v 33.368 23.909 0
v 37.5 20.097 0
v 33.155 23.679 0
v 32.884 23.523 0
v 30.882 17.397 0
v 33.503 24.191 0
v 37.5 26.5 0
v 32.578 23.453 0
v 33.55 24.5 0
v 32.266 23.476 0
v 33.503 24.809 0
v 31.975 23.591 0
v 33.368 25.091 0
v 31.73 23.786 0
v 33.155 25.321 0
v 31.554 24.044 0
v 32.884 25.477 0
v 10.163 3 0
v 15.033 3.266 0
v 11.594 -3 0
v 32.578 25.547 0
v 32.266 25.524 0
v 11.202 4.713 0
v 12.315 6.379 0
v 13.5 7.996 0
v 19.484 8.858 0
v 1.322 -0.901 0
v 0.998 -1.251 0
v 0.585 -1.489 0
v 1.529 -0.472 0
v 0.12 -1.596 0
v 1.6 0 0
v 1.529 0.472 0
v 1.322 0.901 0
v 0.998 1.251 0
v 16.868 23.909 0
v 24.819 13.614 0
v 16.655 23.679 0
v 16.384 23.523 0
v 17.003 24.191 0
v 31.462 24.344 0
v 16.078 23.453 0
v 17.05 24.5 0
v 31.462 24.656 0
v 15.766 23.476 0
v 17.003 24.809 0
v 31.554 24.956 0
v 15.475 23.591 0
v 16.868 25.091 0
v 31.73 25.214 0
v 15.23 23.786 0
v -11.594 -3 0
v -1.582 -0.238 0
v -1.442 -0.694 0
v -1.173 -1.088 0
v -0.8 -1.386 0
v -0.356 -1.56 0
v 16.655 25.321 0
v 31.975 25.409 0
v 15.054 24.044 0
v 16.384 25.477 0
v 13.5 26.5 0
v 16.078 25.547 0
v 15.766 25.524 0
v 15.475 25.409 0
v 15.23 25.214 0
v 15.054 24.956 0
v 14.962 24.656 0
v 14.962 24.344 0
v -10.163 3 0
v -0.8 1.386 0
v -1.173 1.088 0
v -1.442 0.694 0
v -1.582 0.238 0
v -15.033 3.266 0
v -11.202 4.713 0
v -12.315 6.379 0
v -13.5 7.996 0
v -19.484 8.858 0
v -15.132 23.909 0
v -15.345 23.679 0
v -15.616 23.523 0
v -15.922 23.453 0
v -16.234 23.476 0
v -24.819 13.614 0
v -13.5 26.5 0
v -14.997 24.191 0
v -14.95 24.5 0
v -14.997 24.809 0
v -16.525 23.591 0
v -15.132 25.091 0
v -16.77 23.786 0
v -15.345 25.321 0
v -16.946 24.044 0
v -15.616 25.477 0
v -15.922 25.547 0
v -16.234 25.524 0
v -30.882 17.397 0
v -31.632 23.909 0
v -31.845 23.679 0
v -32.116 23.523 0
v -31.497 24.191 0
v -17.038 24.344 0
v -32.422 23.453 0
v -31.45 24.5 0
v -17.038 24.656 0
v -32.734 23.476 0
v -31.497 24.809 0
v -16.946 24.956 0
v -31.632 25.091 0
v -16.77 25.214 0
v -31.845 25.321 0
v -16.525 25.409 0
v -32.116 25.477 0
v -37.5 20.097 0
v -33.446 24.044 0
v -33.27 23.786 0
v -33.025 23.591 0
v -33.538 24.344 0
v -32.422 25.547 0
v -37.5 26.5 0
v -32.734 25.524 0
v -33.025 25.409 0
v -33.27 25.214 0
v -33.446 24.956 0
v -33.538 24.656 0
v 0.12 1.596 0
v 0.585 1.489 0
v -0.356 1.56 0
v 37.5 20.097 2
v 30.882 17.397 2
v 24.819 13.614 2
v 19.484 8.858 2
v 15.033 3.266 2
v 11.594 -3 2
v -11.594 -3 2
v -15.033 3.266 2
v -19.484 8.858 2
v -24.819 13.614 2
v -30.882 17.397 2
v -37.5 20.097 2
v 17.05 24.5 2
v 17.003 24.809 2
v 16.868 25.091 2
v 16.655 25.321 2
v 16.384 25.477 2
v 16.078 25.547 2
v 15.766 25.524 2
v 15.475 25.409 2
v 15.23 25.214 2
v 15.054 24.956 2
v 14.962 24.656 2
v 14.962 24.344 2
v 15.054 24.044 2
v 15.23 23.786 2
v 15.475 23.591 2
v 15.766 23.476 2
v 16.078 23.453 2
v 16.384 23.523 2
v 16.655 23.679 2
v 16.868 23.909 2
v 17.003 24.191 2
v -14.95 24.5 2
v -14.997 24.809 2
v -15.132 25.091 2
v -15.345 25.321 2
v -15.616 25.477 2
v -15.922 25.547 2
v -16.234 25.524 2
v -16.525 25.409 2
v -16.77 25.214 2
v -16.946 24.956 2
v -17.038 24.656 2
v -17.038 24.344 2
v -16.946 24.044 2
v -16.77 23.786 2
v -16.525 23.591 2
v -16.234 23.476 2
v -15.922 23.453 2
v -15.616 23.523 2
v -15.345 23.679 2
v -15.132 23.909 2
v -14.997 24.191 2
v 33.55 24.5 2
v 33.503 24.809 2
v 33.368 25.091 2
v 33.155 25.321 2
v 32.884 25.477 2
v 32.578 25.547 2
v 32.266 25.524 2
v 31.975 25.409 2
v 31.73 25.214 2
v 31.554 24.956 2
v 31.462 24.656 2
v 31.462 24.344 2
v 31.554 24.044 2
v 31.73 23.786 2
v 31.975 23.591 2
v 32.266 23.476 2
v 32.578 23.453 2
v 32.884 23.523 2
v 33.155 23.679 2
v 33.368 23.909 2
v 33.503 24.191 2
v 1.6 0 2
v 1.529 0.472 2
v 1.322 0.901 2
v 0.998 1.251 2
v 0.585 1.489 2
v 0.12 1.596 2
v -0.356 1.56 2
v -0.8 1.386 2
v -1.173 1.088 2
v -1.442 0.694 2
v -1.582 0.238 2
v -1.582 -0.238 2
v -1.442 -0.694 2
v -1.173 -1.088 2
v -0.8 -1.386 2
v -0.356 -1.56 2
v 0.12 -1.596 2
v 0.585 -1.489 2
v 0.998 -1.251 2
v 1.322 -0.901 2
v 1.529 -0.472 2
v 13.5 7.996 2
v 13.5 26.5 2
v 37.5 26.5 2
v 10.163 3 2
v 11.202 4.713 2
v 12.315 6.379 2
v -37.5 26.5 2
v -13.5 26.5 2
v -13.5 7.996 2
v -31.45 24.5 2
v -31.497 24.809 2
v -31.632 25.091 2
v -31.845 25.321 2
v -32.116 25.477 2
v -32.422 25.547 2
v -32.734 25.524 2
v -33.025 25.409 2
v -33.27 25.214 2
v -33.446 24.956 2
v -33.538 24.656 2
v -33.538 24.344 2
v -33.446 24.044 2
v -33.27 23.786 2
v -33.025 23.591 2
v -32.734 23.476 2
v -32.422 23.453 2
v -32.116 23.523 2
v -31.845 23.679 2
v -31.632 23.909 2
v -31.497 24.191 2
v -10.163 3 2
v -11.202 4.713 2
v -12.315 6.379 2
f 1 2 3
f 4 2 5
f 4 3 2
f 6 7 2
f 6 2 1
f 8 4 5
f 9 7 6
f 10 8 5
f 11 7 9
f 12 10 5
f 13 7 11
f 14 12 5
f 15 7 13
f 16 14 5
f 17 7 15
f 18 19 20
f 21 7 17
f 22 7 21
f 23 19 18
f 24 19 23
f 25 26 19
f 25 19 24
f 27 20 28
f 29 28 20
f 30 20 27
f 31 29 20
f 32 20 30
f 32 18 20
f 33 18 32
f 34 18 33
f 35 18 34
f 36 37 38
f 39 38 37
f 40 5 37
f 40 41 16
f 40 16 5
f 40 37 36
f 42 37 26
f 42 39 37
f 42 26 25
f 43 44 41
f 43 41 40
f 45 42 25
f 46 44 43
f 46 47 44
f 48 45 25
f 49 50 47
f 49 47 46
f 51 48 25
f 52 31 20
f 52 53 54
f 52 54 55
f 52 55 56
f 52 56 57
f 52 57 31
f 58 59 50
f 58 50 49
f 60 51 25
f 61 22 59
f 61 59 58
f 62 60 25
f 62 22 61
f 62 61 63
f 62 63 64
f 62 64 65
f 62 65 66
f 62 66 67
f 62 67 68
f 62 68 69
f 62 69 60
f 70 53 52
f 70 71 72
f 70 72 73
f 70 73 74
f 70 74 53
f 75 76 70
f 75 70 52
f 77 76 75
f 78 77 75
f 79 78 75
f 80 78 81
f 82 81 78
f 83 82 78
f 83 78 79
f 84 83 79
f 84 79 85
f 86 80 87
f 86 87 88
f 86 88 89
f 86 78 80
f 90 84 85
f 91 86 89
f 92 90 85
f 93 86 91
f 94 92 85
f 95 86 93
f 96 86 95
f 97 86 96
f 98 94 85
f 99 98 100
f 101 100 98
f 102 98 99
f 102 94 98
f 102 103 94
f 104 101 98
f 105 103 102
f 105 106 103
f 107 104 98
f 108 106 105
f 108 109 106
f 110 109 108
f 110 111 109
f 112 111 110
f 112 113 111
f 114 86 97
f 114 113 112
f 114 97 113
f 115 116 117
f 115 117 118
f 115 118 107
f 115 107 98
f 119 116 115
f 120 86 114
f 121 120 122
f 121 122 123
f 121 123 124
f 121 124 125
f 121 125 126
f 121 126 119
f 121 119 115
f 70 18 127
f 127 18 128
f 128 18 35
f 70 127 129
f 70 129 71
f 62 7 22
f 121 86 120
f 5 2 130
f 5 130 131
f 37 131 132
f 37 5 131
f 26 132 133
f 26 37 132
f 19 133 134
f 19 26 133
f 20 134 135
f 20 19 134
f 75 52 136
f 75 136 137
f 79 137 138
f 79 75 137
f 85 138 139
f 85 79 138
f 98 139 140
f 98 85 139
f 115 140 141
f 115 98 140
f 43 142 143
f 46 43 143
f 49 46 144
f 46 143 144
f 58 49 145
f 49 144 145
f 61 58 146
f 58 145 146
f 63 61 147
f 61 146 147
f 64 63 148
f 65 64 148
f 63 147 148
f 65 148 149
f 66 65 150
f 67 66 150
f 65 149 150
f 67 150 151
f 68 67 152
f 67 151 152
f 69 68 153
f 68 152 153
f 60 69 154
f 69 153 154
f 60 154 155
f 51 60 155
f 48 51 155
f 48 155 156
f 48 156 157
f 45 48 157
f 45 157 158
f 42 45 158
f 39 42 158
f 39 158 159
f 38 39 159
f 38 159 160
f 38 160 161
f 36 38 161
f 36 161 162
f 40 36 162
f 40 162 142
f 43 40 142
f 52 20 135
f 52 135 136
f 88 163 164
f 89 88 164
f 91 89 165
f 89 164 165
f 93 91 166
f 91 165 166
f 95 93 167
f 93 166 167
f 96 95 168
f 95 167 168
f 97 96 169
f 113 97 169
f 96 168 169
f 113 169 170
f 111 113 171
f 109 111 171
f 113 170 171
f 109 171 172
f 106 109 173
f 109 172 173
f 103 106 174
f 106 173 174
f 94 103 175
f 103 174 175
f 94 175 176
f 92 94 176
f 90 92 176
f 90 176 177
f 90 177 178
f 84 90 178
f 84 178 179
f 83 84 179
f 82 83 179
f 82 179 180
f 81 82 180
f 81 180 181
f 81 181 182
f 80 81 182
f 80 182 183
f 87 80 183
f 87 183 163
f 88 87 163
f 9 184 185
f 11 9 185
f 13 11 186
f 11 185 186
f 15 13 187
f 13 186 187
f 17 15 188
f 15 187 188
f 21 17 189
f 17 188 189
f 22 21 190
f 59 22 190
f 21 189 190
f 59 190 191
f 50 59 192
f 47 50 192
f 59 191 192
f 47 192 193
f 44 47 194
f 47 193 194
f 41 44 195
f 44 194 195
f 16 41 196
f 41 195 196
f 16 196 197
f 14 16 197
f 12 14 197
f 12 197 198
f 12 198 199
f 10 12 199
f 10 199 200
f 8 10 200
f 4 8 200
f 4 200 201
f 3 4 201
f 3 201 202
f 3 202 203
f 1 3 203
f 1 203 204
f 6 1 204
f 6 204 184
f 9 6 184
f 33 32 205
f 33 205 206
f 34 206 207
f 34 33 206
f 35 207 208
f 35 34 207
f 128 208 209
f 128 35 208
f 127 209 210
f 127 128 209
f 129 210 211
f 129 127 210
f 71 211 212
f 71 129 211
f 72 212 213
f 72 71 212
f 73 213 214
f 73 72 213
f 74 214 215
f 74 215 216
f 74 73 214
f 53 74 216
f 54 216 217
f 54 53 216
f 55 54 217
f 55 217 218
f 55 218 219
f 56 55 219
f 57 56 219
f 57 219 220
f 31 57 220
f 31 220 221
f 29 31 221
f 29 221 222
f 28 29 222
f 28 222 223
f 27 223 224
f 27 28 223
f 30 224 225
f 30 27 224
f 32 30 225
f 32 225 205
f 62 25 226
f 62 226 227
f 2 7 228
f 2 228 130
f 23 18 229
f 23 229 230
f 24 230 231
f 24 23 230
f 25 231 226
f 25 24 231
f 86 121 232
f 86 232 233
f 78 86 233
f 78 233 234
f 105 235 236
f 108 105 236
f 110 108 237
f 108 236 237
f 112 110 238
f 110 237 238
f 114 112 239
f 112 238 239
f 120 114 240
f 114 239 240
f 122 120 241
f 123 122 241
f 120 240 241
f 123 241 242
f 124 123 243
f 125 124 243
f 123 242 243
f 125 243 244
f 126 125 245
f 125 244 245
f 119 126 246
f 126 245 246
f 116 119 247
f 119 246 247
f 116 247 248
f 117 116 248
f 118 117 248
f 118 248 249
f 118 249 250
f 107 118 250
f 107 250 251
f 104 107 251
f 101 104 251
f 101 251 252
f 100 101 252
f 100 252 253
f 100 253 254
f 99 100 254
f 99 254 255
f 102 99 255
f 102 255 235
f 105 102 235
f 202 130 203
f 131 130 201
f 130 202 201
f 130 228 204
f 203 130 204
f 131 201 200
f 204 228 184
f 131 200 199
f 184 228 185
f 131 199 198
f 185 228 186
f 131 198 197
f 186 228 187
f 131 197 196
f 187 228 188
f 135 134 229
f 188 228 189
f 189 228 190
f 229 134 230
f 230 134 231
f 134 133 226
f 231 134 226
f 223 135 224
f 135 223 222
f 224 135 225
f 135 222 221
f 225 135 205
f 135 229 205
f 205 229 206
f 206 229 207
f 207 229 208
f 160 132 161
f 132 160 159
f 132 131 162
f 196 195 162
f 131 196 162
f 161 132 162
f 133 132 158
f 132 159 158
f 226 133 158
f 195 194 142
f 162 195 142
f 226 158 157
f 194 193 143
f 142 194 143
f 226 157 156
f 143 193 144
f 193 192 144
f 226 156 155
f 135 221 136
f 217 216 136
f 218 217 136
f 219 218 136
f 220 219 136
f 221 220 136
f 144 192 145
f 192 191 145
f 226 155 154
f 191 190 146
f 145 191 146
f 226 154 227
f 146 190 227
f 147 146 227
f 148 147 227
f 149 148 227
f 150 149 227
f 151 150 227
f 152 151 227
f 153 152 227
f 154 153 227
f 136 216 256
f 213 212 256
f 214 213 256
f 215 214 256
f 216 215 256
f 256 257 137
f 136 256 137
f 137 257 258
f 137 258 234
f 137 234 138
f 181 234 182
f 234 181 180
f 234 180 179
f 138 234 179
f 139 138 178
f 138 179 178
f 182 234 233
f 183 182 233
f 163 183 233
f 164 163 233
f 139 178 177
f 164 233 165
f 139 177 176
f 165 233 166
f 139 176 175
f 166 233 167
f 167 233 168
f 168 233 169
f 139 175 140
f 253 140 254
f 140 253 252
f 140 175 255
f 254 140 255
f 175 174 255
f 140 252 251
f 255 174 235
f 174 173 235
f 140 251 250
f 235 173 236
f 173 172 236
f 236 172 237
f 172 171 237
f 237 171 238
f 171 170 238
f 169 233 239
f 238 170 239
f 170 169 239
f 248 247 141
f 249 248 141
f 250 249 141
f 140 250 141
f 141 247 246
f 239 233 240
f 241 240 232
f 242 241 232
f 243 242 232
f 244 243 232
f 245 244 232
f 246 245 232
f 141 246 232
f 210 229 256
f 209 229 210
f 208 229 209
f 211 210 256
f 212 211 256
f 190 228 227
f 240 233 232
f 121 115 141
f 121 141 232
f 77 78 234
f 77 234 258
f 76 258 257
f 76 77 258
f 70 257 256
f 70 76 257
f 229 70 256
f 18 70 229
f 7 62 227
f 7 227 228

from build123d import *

# Parameters (mm, degrees)
SKETCH_1_R          = 1.6
EXTRUDE_1_DEPTH     = 2
SKETCH_2_R          = 1.05
CUT_EXTRUDE_1_DEPTH = 10


with BuildPart() as part:
    # 草图1 → 凸台-拉伸1 (new body)
    with BuildSketch(Plane.XY):
        with BuildLine():
            Line((-10.162831426, 3), (10.162831426, 3))
            ThreePointArc((10.162831426, 3), (11.749775558, 5.55230577), (13.5, 7.995535358))
            Line((13.5, 7.995535358), (13.5, 26.5))
            Line((13.5, 26.5), (37.5, 26.5))
            Line((37.5, 26.5), (37.5, 20.096757974))
            ThreePointArc((37.5, 20.096757974), (22.049805692, 11.349428036), (11.594271261, -3))
            Line((11.594271261, -3), (-11.594271261, -3))
            ThreePointArc((-11.594271261, -3), (-22.049805692, 11.349428036), (-37.5, 20.096757974))
            Line((-37.5, 20.096757974), (-37.5, 26.5))
            Line((-37.5, 26.5), (-13.5, 26.5))
            Line((-13.5, 26.5), (-13.5, 7.995535358))
            ThreePointArc((-13.5, 7.995535358), (-11.749775558, 5.55230577), (-10.162831426, 3))
        make_face()
        Circle(SKETCH_1_R, mode=Mode.SUBTRACT)
    extrude(amount=EXTRUDE_1_DEPTH)

    # 草图2 → 切除-拉伸1 (cut)
    with BuildSketch(Plane.XY.offset(2)):
        with Locations((-32.5, 24.5)):
            Circle(SKETCH_2_R)
        with Locations((-16, 24.5)):
            Circle(SKETCH_2_R)
        with Locations((16, 24.5)):
            Circle(SKETCH_2_R)
        with Locations((32.5, 24.5)):
            Circle(SKETCH_2_R)
    extrude(amount=-CUT_EXTRUDE_1_DEPTH, mode=Mode.SUBTRACT)


solid = part.part
